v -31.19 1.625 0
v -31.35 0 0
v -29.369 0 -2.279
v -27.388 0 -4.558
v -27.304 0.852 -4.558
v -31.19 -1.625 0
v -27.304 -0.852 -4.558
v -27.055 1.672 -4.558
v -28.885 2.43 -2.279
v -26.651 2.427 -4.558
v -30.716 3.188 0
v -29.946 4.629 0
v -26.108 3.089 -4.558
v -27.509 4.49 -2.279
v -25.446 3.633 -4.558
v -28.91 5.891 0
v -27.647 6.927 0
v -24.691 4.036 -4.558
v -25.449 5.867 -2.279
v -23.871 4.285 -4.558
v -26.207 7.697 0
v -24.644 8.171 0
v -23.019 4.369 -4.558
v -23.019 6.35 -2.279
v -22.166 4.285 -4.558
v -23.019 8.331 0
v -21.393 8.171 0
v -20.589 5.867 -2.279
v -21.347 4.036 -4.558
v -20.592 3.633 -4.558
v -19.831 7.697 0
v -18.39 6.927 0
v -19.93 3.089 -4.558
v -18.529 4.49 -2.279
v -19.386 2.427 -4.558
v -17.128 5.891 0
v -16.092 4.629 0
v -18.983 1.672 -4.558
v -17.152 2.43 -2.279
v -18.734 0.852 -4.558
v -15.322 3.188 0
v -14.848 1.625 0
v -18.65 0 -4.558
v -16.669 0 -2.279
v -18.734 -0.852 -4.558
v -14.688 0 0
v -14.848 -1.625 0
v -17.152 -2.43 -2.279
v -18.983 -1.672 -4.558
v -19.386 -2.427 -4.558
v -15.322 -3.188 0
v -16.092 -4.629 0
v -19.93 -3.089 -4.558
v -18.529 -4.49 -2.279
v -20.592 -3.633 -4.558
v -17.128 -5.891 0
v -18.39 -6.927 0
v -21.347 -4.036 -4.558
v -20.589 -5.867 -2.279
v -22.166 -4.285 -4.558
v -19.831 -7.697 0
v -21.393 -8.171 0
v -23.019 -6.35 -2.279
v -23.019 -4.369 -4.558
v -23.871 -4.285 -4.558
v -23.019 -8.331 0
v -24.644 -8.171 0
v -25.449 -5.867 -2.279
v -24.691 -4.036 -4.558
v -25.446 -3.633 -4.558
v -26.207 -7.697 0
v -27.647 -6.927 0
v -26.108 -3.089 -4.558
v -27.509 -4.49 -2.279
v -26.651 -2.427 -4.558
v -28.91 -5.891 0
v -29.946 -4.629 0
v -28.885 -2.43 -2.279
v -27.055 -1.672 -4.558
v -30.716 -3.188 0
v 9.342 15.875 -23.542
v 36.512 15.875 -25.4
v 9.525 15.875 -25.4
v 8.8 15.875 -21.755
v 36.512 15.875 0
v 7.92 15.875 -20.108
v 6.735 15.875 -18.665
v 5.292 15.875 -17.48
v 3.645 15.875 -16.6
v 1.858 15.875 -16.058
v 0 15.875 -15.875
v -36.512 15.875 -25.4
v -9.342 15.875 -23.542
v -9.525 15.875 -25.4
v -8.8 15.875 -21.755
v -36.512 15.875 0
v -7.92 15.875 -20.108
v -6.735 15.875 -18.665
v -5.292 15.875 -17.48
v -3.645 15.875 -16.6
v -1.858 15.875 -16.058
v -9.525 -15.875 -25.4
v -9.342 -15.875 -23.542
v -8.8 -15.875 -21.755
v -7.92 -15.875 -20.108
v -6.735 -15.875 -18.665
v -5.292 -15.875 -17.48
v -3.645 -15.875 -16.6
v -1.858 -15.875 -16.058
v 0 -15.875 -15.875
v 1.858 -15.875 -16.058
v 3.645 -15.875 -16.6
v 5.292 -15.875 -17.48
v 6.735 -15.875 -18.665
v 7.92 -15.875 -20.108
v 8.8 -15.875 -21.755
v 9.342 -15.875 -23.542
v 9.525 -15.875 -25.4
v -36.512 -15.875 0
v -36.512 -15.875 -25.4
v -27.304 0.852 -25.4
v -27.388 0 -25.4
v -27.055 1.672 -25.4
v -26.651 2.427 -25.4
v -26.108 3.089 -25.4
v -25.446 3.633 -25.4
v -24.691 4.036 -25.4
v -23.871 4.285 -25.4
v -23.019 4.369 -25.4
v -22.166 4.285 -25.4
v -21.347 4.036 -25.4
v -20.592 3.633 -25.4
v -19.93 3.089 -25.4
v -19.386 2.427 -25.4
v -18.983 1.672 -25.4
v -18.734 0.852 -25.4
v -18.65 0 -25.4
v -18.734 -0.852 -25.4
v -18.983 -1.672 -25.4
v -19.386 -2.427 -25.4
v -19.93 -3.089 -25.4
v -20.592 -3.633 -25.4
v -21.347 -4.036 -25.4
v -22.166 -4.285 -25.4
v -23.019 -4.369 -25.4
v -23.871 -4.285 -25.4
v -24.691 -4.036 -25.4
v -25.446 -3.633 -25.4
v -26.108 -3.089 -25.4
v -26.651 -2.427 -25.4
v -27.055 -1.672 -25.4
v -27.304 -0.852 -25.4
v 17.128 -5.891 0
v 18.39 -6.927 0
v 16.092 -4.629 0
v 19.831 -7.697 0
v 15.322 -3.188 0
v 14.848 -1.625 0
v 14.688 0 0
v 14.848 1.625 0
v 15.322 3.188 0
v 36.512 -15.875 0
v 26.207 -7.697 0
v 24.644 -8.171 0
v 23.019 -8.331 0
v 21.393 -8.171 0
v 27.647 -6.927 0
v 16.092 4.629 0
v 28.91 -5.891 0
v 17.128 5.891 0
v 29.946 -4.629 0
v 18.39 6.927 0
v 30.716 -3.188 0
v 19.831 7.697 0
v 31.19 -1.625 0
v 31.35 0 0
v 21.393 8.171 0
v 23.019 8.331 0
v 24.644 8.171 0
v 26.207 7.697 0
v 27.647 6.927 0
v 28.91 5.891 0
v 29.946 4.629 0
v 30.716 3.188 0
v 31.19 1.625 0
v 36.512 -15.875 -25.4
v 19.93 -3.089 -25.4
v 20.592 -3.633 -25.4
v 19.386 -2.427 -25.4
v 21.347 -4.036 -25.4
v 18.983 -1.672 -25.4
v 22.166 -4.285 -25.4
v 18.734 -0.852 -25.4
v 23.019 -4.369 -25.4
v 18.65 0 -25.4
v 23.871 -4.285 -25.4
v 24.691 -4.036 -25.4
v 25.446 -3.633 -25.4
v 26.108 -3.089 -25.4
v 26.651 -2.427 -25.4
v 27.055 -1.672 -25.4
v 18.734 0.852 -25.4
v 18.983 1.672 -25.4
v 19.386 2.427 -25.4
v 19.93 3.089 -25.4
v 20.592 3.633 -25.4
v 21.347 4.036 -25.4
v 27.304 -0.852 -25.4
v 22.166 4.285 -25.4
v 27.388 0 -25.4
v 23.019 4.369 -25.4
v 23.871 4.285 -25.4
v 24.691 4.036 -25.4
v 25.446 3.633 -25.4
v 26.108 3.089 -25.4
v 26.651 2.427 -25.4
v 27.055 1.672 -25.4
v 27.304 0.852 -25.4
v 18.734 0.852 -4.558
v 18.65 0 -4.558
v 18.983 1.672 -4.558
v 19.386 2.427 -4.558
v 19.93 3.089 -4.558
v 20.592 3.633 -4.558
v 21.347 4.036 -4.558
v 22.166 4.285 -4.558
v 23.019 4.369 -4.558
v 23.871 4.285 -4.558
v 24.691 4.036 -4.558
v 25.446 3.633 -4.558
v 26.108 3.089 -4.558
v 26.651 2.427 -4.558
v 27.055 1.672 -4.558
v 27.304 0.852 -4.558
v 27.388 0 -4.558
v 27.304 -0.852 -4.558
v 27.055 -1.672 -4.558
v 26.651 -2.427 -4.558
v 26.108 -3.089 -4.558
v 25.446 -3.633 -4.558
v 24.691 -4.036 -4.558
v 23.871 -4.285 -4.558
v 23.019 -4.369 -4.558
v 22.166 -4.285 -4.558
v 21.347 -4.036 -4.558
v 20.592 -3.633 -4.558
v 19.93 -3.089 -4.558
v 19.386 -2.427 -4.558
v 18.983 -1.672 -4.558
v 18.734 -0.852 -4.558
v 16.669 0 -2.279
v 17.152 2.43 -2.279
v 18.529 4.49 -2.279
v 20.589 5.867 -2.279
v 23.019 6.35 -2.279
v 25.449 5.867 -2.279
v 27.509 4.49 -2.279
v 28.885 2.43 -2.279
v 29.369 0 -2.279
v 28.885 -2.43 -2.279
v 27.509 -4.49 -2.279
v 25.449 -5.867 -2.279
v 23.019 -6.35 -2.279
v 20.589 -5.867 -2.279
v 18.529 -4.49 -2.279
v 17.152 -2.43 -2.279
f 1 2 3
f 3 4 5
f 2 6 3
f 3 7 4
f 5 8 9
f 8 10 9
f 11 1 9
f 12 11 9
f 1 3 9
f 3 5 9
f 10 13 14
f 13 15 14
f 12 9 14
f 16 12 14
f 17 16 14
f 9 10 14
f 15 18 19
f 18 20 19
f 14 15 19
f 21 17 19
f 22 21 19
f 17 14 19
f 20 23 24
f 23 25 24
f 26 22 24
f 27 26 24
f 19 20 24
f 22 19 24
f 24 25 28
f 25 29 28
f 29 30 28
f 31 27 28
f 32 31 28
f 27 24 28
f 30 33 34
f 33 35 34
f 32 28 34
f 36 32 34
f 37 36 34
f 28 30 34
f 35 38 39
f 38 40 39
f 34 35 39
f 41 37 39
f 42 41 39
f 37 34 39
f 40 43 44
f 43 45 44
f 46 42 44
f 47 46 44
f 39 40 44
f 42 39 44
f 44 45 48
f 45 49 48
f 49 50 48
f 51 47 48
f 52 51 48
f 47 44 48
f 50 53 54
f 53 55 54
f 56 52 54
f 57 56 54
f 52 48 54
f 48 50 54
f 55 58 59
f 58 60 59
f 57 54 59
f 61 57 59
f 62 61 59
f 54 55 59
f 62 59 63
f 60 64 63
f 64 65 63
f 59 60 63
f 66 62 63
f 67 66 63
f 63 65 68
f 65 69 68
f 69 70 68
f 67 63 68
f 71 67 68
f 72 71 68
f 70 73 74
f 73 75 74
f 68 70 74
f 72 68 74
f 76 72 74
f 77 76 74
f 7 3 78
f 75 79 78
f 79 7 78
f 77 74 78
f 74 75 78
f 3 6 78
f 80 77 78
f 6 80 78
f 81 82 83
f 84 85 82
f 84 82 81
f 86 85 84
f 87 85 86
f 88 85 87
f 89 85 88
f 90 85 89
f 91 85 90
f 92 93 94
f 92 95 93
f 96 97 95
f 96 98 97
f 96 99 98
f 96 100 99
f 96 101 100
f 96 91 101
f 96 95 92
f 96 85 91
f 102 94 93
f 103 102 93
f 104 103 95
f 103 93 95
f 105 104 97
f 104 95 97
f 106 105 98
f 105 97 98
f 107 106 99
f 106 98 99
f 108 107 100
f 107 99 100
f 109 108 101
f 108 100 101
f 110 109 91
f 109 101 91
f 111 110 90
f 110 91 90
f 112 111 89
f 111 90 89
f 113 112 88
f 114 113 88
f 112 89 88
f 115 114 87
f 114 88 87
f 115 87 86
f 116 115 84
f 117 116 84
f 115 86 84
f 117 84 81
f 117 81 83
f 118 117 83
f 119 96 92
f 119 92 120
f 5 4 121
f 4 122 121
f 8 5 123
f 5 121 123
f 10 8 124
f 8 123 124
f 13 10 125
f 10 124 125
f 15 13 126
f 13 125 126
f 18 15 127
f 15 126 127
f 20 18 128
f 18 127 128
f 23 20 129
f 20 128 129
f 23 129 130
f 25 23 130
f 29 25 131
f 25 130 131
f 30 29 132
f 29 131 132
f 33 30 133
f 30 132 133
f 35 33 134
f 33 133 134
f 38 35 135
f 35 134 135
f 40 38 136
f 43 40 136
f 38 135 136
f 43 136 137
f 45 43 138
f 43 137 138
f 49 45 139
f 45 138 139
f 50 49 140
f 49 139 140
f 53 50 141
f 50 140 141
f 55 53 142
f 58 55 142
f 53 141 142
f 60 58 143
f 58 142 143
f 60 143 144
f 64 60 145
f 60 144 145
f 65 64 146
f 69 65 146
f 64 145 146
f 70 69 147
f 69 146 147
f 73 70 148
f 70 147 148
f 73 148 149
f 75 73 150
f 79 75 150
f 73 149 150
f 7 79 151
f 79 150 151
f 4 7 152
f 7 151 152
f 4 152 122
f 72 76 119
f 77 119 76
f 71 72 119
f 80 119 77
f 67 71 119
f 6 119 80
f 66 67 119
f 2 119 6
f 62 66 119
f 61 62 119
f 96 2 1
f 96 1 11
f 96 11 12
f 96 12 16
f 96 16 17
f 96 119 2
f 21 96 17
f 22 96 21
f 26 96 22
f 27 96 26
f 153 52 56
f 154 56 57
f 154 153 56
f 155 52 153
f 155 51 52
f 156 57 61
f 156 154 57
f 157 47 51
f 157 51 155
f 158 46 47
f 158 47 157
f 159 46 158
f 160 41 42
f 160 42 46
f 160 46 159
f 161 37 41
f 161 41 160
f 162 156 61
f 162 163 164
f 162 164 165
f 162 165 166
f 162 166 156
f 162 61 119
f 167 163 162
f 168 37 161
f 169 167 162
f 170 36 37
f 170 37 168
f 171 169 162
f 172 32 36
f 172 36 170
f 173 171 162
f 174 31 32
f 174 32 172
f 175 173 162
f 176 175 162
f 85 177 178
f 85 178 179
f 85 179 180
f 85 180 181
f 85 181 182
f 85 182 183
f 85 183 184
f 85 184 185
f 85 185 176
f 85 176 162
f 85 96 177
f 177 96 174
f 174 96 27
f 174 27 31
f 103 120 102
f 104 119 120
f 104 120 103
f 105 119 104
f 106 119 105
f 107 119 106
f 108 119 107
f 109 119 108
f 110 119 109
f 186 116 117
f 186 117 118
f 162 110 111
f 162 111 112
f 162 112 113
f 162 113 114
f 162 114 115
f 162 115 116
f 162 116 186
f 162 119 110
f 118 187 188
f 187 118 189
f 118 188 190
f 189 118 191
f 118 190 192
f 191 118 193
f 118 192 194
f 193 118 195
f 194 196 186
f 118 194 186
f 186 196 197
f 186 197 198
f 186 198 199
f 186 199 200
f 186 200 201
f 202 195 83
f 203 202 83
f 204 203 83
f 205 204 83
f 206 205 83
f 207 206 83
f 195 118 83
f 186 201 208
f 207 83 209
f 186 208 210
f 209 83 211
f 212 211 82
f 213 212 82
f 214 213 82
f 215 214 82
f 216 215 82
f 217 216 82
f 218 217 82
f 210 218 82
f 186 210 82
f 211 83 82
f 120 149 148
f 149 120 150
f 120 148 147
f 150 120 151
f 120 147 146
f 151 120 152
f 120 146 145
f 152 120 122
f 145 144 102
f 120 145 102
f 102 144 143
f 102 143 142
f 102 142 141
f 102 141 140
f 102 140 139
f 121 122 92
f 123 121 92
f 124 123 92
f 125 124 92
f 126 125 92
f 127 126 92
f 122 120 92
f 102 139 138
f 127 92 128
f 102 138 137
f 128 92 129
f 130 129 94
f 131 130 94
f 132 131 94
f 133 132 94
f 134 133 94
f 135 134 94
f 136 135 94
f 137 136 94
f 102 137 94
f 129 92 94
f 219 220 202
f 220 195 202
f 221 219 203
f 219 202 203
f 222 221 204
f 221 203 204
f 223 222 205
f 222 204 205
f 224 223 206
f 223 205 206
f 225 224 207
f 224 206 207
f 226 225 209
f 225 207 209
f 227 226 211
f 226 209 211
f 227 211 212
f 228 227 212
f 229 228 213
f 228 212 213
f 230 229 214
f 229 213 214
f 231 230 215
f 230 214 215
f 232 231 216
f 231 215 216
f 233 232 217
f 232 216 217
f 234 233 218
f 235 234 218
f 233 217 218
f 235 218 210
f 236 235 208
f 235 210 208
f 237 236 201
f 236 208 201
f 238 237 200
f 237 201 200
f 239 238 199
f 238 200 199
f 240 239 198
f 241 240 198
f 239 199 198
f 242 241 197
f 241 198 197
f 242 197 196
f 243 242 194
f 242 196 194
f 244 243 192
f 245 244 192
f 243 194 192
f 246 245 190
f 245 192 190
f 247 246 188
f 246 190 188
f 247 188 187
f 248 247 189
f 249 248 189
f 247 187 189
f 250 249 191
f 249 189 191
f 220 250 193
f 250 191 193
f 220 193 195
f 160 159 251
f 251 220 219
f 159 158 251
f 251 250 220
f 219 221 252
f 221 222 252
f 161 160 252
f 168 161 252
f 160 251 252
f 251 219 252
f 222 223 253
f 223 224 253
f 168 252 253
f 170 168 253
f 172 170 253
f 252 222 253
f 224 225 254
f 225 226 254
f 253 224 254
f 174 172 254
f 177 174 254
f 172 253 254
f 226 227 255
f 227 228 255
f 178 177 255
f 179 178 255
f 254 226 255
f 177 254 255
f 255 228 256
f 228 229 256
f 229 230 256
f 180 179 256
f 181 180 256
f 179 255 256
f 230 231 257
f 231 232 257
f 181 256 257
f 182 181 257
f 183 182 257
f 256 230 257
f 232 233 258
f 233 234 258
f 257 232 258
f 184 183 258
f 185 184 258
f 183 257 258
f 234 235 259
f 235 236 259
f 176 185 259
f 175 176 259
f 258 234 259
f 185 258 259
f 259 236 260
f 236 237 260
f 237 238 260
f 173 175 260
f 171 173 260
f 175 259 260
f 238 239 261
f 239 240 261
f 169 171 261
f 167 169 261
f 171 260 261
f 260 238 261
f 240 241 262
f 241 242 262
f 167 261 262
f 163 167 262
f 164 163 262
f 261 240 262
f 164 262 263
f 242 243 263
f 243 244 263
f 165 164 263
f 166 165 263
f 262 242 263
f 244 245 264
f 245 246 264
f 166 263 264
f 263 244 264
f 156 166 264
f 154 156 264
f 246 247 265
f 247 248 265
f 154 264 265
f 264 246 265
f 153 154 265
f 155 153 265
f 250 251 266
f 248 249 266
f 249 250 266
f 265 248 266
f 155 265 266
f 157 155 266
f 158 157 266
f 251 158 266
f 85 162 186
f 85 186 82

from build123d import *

# Parameters (mm, degrees)
F1_DEPTH       = 25.4
F2_D           = 8.7376
F2_DEPTH       = 29.6333418
F2_CSINK_D     = 16.6624
F2_CSINK_ANGLE = 82
F2_TIP         = 2.6250398724
F4_D           = 19.05


# Not quite as in the source:
# - a feature names something its author has since deleted; it is built from what else it names


with BuildPart() as f1:
    # F0 (on Top) → F1 (new body)
    with BuildSketch(Plane.XY):
        Polygon((36.5125, -15.875), (36.5125, 15.875), (0, 15.875), (-36.5125, 15.875), (-36.5125, -15.875), align=None)
    extrude(amount=-F1_DEPTH)

    # F2
    with Locations(Plane.XY):
        with Locations((-23.01875, 0), (23.01875, 0)):
            CounterSinkHole(F2_D / 2, F2_CSINK_D / 2, depth=F2_DEPTH, counter_sink_angle=F2_CSINK_ANGLE)
            with Locations((0, 0, -(F2_DEPTH + F2_TIP / 2))):  # 118° drill point
                Cone(0, F2_D / 2, F2_TIP, mode=Mode.SUBTRACT)

    # F4 (through all)
    with Locations(Plane.XZ.offset(15.875)):
        with Locations((0, -25.4)):
            Hole(F4_D / 2)


solid = f1.part
